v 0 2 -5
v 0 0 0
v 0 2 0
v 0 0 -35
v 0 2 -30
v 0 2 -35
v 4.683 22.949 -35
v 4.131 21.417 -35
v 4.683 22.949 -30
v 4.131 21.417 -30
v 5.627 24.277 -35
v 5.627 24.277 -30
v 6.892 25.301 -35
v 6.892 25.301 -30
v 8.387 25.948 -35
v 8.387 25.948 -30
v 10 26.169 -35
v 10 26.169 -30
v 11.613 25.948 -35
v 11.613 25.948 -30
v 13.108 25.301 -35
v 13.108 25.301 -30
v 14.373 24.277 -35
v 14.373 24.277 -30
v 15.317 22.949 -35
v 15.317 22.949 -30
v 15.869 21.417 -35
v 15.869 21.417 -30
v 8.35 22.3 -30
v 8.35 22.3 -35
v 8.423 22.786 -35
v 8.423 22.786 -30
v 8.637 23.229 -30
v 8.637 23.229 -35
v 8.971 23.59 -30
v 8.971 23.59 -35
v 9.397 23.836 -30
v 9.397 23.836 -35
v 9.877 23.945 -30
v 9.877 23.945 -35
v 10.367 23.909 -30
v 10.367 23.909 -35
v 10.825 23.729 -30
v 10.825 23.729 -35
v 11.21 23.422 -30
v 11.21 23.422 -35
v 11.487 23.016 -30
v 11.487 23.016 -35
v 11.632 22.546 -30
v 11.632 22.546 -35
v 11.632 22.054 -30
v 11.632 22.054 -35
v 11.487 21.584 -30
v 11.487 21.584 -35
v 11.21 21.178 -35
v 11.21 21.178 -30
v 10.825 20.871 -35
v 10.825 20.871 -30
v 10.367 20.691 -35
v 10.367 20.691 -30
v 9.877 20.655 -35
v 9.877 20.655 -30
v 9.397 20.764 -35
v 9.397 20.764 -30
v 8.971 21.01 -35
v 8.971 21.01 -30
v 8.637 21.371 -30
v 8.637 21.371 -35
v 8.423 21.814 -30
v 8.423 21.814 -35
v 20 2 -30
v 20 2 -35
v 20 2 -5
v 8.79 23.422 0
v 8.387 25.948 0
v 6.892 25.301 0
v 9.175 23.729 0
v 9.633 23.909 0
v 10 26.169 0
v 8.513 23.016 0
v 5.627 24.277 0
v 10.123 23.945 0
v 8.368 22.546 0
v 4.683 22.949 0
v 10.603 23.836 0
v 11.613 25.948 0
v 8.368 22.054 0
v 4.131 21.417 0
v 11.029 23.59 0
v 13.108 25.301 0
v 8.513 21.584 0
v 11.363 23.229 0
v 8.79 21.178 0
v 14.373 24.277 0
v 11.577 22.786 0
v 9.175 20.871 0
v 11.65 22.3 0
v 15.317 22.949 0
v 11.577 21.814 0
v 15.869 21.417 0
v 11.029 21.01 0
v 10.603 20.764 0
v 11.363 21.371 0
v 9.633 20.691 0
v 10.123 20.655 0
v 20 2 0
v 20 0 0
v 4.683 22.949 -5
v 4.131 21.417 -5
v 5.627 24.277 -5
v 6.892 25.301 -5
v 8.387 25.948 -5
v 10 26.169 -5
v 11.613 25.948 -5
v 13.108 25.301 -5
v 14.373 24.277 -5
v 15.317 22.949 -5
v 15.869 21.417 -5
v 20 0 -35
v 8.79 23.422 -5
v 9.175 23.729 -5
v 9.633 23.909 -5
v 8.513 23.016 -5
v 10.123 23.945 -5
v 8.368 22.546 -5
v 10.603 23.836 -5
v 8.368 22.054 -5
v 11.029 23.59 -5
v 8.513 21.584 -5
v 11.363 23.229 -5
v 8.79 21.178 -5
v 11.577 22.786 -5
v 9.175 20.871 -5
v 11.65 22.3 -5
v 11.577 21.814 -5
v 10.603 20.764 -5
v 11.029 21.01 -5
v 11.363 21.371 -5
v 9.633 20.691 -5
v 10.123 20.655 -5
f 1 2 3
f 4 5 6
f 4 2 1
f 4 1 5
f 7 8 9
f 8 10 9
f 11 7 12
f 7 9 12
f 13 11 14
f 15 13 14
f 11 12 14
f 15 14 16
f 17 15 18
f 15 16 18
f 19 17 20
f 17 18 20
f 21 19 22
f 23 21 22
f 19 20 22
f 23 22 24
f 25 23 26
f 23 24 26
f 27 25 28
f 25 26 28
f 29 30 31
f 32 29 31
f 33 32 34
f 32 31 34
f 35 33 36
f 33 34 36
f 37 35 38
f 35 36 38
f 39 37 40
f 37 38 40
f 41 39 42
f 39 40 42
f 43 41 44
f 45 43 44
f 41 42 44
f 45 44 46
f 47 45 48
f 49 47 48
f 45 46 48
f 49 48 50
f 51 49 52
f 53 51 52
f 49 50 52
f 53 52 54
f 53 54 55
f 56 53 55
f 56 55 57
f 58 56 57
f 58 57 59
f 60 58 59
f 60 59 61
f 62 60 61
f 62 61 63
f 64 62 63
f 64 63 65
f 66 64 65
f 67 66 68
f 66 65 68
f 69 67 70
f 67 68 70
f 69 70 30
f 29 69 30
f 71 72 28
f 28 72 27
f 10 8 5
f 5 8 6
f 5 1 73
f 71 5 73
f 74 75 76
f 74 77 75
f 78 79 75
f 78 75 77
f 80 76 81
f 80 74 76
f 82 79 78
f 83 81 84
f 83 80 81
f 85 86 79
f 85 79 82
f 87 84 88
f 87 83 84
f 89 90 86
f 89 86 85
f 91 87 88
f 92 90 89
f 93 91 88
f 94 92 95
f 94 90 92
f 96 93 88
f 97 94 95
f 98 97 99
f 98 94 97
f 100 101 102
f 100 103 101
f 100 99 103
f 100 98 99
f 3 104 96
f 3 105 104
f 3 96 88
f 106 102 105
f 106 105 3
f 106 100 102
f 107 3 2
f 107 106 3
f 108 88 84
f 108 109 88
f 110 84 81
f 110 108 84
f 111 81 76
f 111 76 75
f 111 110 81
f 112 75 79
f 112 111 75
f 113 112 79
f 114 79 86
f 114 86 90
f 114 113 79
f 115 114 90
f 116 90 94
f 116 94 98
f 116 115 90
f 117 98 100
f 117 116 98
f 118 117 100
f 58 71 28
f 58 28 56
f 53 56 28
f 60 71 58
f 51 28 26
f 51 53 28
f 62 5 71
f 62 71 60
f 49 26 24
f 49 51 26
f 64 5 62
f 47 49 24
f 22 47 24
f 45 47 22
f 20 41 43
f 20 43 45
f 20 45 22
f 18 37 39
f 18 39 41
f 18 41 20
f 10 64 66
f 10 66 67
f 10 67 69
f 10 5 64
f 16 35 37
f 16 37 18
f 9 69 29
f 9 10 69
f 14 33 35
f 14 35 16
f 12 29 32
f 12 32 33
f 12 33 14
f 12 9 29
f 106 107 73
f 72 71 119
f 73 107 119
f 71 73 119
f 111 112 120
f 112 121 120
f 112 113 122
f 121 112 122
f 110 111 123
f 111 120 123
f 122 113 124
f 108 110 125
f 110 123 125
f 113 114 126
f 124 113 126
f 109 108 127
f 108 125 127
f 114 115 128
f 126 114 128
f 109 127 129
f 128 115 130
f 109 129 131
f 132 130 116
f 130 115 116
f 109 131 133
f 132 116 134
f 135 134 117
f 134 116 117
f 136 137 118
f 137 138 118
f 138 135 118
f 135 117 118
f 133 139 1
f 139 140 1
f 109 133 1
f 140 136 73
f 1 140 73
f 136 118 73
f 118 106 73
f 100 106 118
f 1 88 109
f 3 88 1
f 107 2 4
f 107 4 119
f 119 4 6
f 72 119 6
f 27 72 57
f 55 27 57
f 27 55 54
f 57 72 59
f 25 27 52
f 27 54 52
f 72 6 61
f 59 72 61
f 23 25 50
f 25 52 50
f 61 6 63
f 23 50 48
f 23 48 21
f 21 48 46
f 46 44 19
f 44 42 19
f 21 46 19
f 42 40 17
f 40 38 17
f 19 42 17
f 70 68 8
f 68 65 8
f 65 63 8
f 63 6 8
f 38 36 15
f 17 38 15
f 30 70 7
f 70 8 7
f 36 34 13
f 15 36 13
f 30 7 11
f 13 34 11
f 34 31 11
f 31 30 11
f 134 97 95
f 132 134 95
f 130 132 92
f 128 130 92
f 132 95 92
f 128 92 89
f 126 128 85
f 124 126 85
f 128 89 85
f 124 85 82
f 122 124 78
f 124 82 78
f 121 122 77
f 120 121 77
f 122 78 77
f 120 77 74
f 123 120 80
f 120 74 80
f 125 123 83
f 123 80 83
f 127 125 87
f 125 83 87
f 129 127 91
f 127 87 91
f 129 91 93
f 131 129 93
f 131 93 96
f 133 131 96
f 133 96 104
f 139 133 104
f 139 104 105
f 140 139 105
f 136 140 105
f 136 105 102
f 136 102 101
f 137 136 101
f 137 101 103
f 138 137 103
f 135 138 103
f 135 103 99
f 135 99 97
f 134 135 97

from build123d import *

# Parameters (mm, degrees)
SKETCH2_W                       = 20
SKETCH2_H                       = 35
BOSS_EXTRUDE2_DEPTH             = 2
BOSS_EXTRUDE5_DEPTH             = 5
BOSS_EXTRUDE6_DEPTH             = 5
FILLET1_R                       = 6
PREFORO_DA_MASCHIARE_M4_1_D     = 3.3
PREFORO_DA_MASCHIARE_M4_1_DEPTH = 5.000103078
PREFORO_DA_MASCHIARE_M4_2_D     = 3.3


with BuildPart() as part:
    # Sketch2 → Boss-Extrude2 (new body)
    with BuildSketch(Plane(origin=(0, 0, 0), x_dir=(1, 0, 0), z_dir=(0, 1, 0))):
        with Locations((10, 17.5)):
            Rectangle(SKETCH2_W, SKETCH2_H)
    extrude(amount=BOSS_EXTRUDE2_DEPTH)

    # 3DSketch3 → Boss-Extrude5 (add)
    with BuildSketch(Plane(origin=(10, 49, 0), x_dir=(-0.20810764446485872, -0.9781059289848355, 0), z_dir=(0, 0, 1))):
        Polygon((0, 0), (48.052055107, 0), (43.889902218, 19.56211858), align=None)
    extrude(amount=-BOSS_EXTRUDE5_DEPTH)

    # 3DSketch4 → Boss-Extrude6 (add)
    with BuildSketch(Plane(origin=(10, 2, -35), x_dir=(0, 1, 0), z_dir=(0, 0, 1))):
        Polygon((47, 0), (0, 10), (0, -10), align=None)
    extrude(amount=BOSS_EXTRUDE6_DEPTH)

    # Fillet1
    fillet1_edges = [part.edges().sort_by_distance(p)[0] for p in [
        (10, 49, -2.5),
        (10, 49, -32.5),
    ]]
    fillet(fillet1_edges, radius=FILLET1_R)

    # Preforo da maschiare M4-1
    with Locations(Plane.XY.offset(-30)):
        with Locations((10, 22.3)):
            Hole(PREFORO_DA_MASCHIARE_M4_1_D / 2, depth=PREFORO_DA_MASCHIARE_M4_1_DEPTH)

    # Preforo da maschiare M4-2 (through all)
    with Locations(Plane(origin=(0, 0, -5), x_dir=(-1, 0, 0), z_dir=(0, 0, -1))):
        with Locations((-10, 22.3)):
            Hole(PREFORO_DA_MASCHIARE_M4_2_D / 2)


solid = part.part
